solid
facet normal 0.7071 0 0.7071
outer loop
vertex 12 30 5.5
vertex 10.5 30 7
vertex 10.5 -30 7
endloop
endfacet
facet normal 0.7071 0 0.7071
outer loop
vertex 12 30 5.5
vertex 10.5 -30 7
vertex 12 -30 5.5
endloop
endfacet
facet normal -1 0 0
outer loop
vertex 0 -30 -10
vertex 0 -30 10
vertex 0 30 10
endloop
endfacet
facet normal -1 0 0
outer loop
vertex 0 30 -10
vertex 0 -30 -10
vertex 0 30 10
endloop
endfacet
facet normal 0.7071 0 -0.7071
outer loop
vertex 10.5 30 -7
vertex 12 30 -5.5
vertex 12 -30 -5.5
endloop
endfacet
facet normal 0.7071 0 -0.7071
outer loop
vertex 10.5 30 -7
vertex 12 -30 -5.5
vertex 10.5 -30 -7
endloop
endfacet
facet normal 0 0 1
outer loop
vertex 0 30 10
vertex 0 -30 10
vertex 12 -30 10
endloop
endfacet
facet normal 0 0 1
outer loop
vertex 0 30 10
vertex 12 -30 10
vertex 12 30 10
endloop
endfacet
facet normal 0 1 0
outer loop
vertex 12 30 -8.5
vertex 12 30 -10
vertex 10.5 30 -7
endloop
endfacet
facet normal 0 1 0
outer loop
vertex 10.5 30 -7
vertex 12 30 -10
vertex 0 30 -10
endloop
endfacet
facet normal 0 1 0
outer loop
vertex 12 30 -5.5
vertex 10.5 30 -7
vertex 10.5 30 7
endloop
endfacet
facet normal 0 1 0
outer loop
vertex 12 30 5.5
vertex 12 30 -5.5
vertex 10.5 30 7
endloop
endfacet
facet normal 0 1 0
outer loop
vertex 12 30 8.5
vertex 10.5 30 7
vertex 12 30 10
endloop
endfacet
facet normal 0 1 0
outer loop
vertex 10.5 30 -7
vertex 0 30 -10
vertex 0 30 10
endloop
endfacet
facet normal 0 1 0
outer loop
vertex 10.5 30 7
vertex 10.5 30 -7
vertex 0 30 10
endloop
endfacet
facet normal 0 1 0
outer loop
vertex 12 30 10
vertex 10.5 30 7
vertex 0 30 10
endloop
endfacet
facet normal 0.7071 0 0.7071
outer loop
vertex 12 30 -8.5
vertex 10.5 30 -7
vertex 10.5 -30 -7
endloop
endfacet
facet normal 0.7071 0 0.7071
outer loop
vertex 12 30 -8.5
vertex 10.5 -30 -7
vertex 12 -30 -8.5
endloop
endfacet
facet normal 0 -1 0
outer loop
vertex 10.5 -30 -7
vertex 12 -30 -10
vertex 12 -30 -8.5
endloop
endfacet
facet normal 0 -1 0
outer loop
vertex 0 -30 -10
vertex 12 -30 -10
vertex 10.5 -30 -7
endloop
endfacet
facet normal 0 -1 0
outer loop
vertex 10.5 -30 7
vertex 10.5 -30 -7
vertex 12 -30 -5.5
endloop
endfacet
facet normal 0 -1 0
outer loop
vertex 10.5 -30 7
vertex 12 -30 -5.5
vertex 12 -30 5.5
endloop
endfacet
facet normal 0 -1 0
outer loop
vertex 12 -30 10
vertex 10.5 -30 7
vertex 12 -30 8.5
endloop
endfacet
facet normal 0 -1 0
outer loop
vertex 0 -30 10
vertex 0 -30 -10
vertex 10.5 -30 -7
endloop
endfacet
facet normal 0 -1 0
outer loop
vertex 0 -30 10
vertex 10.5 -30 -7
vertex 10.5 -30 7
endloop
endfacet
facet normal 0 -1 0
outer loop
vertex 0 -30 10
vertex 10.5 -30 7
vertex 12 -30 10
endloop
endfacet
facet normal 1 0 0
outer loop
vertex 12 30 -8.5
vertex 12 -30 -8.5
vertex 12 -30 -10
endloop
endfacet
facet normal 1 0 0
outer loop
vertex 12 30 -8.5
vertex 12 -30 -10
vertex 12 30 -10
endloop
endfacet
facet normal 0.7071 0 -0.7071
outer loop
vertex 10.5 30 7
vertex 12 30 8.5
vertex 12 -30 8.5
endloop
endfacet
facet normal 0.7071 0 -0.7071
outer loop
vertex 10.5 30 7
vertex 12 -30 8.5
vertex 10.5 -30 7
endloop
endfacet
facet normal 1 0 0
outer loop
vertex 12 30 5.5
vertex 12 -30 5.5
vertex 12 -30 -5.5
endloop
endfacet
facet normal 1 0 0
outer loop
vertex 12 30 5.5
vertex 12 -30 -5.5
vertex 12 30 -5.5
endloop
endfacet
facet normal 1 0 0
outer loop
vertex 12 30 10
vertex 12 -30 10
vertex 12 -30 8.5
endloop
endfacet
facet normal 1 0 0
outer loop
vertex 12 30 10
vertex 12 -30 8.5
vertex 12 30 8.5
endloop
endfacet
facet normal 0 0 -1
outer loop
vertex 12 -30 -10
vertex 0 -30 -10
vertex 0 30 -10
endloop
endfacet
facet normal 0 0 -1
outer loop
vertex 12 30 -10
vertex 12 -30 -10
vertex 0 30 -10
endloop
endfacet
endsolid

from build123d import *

# Parameters (mm, degrees)
F0_W     = 60
F0_H     = 20
F1_DEPTH = 12
F3_DEPTH = 60.001


with BuildPart() as f1:
    # F0 (on Right) → F1 (new body)
    with BuildSketch(Plane.YZ):
        Rectangle(F0_W, F0_H)
    extrude(amount=F1_DEPTH)

    # F2 (on face) → F3 (cut, through all)
    with BuildSketch(Plane.XZ.offset(30)):
        Polygon((12, 8.5), (10.5, 7), (12, 5.5), align=None)
        Polygon((12, -8.5), (12, -5.5), (10.5, -7), align=None)
    extrude(amount=-F3_DEPTH, mode=Mode.SUBTRACT)


solid = f1.part
